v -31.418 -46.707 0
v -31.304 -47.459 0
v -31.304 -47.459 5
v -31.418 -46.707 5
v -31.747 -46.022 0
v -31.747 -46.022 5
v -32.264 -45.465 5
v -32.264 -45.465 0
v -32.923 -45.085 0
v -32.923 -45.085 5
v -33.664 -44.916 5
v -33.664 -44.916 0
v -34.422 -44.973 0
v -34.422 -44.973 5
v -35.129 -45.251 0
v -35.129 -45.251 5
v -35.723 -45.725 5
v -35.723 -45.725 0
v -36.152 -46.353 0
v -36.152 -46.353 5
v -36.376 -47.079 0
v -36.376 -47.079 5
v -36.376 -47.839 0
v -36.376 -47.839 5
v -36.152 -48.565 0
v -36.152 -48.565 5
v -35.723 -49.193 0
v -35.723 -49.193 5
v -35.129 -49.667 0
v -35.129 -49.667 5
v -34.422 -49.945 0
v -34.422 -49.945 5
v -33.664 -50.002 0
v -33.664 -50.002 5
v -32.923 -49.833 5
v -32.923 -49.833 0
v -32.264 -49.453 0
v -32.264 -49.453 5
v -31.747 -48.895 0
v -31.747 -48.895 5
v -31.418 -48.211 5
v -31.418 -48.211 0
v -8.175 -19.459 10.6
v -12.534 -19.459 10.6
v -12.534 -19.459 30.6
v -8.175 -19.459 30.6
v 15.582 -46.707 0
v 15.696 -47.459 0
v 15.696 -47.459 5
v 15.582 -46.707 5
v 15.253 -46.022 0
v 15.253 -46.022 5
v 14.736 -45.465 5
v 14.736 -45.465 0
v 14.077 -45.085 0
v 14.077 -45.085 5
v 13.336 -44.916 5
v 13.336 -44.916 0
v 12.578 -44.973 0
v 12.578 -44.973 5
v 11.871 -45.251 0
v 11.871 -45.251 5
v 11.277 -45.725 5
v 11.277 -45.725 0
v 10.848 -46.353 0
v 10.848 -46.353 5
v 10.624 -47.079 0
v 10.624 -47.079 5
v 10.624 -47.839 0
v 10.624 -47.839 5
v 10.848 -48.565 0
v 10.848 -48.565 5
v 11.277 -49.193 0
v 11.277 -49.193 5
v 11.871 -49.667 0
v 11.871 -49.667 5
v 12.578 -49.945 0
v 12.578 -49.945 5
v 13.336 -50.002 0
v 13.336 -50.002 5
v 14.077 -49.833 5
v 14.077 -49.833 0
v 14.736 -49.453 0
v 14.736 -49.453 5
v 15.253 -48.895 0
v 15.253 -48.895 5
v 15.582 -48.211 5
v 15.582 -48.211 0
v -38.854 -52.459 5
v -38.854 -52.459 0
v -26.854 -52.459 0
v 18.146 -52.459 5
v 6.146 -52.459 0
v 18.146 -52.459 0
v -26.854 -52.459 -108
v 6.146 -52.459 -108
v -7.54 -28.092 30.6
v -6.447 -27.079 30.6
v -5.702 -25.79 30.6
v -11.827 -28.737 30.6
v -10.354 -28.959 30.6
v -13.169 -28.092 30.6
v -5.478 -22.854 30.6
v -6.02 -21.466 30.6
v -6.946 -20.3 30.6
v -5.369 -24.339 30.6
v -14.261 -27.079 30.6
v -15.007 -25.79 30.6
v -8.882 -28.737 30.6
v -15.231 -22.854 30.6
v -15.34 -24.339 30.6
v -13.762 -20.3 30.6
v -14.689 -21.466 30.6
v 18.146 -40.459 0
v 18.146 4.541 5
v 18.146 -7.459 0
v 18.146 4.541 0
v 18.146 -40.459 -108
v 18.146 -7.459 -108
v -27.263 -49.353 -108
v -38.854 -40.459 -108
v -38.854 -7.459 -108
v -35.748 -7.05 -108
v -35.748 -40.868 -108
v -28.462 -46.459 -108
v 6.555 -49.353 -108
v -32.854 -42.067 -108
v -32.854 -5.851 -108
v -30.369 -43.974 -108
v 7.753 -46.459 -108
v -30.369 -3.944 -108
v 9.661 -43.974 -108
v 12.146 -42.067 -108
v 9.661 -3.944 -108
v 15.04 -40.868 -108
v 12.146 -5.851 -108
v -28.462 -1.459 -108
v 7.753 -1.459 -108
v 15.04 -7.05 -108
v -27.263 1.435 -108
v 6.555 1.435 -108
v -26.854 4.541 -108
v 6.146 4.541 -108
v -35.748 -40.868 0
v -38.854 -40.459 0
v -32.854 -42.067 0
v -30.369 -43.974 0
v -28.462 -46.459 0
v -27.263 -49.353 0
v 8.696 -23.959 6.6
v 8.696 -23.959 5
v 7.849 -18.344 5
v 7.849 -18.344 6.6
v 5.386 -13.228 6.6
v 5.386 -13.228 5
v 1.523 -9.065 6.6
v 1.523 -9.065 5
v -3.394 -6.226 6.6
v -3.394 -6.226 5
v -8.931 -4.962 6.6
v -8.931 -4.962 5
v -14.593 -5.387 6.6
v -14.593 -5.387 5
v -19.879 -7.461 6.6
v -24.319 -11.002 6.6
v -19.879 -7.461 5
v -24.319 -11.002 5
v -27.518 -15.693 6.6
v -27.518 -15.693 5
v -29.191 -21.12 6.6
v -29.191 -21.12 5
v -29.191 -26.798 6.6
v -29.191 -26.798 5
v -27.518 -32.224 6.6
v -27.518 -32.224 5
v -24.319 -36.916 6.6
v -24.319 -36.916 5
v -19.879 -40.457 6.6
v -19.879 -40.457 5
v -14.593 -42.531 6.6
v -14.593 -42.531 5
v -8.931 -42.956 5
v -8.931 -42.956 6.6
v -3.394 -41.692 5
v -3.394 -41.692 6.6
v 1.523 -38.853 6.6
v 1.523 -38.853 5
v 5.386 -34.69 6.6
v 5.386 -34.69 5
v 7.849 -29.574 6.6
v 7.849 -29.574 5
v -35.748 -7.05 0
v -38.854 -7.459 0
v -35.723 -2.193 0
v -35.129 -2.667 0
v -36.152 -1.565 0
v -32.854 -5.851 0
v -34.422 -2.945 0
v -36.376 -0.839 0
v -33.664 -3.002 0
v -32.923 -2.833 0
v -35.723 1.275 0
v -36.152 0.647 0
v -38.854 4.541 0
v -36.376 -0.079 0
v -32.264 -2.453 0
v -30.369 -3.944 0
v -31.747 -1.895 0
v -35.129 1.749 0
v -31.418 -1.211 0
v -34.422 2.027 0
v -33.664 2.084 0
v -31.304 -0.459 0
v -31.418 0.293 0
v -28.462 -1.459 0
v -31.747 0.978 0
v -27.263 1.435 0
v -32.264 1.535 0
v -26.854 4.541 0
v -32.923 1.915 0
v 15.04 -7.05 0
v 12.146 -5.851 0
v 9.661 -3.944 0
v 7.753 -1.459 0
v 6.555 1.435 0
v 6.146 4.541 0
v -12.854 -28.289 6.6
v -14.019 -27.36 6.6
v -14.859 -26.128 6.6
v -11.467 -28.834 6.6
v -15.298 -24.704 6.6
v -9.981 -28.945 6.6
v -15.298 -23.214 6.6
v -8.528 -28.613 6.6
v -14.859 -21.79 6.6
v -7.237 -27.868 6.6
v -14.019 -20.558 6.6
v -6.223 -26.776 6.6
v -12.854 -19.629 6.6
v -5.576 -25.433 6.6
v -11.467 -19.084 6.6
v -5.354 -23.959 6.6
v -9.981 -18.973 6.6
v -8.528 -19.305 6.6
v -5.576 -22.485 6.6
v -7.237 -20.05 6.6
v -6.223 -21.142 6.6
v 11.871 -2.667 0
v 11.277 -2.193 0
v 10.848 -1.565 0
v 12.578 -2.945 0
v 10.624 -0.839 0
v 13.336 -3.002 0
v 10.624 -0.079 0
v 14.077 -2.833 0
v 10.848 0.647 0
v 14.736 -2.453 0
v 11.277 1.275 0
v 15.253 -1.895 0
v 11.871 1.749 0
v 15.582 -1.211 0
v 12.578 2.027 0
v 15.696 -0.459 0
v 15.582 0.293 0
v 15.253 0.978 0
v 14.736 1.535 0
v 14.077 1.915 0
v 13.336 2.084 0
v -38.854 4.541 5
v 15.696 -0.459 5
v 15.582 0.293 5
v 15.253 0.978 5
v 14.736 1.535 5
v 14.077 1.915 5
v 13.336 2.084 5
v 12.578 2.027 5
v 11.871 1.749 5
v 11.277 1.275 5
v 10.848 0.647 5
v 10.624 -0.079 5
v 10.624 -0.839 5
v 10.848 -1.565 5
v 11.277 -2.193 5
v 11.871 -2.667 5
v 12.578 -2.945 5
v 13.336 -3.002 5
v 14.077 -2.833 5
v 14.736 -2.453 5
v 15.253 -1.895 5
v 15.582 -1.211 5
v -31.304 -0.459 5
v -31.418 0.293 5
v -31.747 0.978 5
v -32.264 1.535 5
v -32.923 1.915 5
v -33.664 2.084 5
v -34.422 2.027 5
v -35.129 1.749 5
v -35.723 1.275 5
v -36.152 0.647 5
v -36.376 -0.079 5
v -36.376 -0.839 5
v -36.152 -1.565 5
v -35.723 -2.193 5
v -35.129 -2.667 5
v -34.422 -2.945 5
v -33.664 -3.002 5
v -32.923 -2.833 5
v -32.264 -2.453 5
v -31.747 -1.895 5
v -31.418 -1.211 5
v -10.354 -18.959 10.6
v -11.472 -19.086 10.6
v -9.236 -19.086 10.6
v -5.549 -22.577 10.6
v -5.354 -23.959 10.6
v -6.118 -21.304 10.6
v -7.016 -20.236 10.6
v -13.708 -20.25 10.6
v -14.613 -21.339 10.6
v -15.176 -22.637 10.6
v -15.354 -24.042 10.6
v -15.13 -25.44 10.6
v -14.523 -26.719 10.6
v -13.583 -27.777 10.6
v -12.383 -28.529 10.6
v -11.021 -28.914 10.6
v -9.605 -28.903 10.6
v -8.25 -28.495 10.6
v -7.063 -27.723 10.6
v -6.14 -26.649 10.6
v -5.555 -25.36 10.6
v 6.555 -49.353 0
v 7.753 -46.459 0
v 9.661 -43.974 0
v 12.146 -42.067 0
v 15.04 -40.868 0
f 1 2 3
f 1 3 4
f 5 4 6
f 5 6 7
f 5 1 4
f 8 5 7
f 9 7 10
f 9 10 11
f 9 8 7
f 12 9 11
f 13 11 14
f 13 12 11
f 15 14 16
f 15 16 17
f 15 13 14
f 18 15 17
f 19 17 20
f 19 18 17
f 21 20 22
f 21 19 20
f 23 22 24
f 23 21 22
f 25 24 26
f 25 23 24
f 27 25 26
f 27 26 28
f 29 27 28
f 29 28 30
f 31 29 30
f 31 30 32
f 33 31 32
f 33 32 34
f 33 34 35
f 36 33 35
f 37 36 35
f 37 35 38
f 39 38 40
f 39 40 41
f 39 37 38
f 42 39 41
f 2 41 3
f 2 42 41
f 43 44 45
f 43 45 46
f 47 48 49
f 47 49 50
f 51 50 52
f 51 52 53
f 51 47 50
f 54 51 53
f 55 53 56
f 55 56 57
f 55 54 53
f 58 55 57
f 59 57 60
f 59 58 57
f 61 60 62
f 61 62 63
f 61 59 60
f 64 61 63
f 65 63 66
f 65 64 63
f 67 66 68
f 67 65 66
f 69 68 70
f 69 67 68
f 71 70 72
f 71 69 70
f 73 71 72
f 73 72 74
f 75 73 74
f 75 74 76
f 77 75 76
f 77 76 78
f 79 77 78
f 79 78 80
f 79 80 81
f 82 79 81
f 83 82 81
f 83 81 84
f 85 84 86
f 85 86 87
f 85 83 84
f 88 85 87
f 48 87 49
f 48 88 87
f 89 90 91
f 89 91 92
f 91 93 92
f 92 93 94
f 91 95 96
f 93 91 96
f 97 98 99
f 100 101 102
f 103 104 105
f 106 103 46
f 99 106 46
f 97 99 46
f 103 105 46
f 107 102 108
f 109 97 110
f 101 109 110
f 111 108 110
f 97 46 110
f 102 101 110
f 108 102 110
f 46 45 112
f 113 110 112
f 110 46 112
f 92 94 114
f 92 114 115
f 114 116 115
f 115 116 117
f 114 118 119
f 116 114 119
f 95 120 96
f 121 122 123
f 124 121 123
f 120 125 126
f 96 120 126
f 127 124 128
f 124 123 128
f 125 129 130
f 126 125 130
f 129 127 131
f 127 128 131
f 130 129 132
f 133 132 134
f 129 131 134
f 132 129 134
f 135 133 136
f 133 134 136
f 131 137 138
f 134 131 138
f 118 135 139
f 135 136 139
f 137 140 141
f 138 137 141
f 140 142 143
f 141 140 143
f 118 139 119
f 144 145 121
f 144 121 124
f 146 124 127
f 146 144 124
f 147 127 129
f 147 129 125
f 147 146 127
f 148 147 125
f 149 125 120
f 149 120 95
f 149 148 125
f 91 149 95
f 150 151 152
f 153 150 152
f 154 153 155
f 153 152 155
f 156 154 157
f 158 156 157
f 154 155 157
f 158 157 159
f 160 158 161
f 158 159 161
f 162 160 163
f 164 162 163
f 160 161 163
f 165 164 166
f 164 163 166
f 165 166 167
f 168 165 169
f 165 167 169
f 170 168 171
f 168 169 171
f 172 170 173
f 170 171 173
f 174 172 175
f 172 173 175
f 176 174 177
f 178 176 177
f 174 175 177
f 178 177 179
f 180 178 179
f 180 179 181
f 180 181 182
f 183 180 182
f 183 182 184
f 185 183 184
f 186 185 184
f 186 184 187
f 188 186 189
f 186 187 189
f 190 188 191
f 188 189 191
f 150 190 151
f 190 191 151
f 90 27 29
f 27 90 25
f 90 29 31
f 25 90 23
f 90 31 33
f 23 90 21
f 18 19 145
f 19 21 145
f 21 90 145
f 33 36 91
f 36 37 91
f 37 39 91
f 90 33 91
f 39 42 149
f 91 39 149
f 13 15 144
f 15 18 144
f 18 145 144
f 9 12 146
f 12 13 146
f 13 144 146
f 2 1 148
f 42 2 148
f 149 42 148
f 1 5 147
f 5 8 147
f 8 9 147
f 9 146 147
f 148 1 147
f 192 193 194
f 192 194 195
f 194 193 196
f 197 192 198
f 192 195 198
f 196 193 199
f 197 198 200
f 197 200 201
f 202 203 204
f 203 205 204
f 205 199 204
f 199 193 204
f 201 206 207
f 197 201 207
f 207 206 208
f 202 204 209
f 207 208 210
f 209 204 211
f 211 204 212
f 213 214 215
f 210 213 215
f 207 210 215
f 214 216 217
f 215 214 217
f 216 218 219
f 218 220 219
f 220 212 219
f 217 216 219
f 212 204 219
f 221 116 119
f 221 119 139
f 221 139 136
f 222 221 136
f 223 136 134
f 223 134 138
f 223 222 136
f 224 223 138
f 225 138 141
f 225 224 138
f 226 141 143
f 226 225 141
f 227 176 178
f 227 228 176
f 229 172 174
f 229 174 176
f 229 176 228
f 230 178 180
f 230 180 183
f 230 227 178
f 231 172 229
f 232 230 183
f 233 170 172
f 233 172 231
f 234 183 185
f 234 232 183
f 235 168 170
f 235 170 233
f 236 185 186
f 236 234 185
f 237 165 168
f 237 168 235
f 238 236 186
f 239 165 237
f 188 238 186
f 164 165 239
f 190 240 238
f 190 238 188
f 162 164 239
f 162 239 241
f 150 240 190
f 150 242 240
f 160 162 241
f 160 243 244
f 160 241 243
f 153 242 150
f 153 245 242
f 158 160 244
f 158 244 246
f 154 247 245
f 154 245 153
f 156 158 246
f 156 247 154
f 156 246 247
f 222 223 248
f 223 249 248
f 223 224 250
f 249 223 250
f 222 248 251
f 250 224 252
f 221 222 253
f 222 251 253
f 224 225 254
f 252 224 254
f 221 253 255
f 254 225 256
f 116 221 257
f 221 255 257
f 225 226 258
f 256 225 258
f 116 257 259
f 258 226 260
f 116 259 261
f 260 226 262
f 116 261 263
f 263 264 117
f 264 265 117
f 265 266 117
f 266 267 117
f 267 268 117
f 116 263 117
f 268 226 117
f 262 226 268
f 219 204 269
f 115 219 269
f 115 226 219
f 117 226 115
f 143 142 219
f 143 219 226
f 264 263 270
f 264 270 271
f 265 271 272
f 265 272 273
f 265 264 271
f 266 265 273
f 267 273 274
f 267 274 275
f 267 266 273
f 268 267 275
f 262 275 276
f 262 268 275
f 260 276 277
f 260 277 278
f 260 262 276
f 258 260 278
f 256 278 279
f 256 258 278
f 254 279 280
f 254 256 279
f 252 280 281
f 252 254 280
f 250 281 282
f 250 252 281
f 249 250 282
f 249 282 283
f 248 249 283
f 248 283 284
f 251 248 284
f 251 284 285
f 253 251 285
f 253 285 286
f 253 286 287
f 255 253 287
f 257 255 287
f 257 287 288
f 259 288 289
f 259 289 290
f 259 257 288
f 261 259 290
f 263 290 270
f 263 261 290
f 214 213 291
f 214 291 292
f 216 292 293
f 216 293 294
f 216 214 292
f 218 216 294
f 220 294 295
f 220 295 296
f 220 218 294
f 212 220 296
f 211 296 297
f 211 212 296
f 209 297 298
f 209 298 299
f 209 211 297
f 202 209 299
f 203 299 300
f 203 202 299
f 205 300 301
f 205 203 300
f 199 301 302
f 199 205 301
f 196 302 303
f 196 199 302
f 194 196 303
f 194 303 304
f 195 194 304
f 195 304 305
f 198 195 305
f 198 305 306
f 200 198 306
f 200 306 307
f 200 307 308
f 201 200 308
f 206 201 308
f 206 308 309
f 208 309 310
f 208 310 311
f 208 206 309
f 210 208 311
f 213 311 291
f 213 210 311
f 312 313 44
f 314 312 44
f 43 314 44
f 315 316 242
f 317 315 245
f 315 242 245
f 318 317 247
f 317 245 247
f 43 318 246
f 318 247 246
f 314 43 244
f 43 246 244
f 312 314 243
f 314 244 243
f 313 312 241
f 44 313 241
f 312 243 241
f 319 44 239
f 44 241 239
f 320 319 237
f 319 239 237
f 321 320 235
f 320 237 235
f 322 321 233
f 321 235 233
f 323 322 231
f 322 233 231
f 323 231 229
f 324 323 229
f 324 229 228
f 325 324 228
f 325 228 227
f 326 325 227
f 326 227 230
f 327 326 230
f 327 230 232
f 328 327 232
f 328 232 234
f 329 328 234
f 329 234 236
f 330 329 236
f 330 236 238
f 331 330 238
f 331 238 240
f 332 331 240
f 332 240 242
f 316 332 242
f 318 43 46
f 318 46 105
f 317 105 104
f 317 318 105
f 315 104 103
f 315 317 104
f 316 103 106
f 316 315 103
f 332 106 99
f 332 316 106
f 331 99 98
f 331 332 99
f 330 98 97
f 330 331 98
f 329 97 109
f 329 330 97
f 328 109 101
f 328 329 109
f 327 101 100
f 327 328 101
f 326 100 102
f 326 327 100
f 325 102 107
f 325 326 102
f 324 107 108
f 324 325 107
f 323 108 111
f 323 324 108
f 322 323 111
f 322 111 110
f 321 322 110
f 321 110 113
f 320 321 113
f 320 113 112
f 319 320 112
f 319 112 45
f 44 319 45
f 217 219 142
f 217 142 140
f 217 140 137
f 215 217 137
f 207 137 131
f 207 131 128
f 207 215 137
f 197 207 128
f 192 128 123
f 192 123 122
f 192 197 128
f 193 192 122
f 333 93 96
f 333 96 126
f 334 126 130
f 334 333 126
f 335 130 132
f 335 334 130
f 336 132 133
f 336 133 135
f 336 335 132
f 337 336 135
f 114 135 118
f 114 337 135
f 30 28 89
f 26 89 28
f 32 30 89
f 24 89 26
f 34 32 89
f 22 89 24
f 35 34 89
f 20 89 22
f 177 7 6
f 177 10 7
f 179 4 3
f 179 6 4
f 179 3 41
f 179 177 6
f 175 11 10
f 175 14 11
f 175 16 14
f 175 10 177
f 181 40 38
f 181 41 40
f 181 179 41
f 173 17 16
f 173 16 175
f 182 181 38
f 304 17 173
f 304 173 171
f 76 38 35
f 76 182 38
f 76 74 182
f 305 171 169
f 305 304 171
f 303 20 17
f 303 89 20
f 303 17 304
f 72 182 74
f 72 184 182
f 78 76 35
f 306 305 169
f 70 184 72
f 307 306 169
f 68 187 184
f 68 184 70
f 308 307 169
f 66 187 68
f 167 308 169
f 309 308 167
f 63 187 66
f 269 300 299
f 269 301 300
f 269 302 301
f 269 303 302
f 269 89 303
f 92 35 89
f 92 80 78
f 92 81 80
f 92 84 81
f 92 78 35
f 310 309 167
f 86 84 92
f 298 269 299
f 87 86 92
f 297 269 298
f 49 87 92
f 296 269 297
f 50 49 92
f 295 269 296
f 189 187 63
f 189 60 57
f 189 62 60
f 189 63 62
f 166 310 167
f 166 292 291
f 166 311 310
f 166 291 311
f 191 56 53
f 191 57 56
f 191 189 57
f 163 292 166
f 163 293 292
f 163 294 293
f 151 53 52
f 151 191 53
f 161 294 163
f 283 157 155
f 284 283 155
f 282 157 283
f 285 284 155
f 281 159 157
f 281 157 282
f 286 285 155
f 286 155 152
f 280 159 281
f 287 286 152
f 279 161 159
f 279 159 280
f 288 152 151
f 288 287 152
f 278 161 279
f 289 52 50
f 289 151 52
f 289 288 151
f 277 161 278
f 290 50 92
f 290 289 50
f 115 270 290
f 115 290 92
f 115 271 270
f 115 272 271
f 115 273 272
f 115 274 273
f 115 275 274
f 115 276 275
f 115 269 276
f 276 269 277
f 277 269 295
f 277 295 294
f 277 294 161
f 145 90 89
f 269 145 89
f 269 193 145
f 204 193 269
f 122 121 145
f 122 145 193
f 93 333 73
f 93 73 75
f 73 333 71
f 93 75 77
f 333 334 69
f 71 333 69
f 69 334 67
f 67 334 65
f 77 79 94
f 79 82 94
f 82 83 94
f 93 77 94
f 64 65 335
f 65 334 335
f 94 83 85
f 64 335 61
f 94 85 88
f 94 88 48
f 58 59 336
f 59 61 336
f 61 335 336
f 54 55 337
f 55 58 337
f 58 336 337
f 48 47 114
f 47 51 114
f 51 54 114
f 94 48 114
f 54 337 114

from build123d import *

# Parameters (mm, degrees)
ESQUISSE1_W        = 57
ESQUISSE1_H        = 57
ESQUISSE1_R        = 2.55
BOSS_EXTRU_1_DEPTH = 5
BOSS_EXTRU_2_DEPTH = 108
ESQUISSE3_R        = 19.05
BOSS_EXTRU_3_DEPTH = 1.6
ESQUISSE4_R        = 5
BOSS_EXTRU_4_DEPTH = 4
BOSS_EXTRU_5_DEPTH = 20


with BuildPart() as part:
    # Esquisse1 → Boss.-Extru.1 (new body)
    with BuildSketch(Plane.XY):
        with Locations((-10.354214819, -23.958965641)):
            Rectangle(ESQUISSE1_W, ESQUISSE1_H)
        with Locations((-33.854214819, -0.458965641)):
            Circle(ESQUISSE1_R, mode=Mode.SUBTRACT)
        with Locations((13.145785181, -0.458965641)):
            Circle(ESQUISSE1_R, mode=Mode.SUBTRACT)
        with Locations((13.145785181, -47.458965641)):
            Circle(ESQUISSE1_R, mode=Mode.SUBTRACT)
        with Locations((-33.854214819, -47.458965641)):
            Circle(ESQUISSE1_R, mode=Mode.SUBTRACT)
    extrude(amount=BOSS_EXTRU_1_DEPTH)

    # Esquisse2 → Boss.-Extru.2 (add)
    with BuildSketch(Plane(origin=(0, 0, 0), x_dir=(-1, 0, 0), z_dir=(0, 0, -1))):
        with BuildLine():
            Line((-6.145785181, 4.541034359), (26.854214819, 4.541034359))
            ThreePointArc((26.854214819, 4.541034359), (30.368933444, -3.944247016), (38.854214819, -7.458965641))
            Line((38.854214819, -7.458965641), (38.854214819, -40.458965641))
            ThreePointArc((38.854214819, -40.458965641), (30.368933444, -43.973684267), (26.854214819, -52.458965641))
            Line((26.854214819, -52.458965641), (-6.145785181, -52.458965641))
            ThreePointArc((-6.145785181, -52.458965641), (-9.660503807, -43.973684267), (-18.145785181, -40.458965641))
            Line((-18.145785181, -40.458965641), (-18.145785181, -7.458965641))
            ThreePointArc((-18.145785181, -7.458965641), (-9.660503807, -3.944247016), (-6.145785181, 4.541034359))
        make_face()
    extrude(amount=BOSS_EXTRU_2_DEPTH)

    # Esquisse3 → Boss.-Extru.3 (add)
    with BuildSketch(Plane.XY.offset(5)):
        with Locations((-10.354214819, -23.958965641)):
            Circle(ESQUISSE3_R)
    extrude(amount=BOSS_EXTRU_3_DEPTH)

    # Esquisse4 → Boss.-Extru.4 (add)
    with BuildSketch(Plane.XY.offset(6.6)):
        with Locations((-10.354214819, -23.958965641)):
            Circle(ESQUISSE4_R)
    extrude(amount=BOSS_EXTRU_4_DEPTH)

    # Esquisse5 → Boss.-Extru.5 (add)
    with BuildSketch(Plane.XY.offset(10.6)):
        with BuildLine():
            Line((-12.53366429, -19.458965641), (-8.174765347, -19.458965641))
            ThreePointArc((-8.174765347, -19.458965641), (-10.354214819, -28.958965641), (-12.53366429, -19.458965641))
        make_face()
    extrude(amount=BOSS_EXTRU_5_DEPTH)


solid = part.part
